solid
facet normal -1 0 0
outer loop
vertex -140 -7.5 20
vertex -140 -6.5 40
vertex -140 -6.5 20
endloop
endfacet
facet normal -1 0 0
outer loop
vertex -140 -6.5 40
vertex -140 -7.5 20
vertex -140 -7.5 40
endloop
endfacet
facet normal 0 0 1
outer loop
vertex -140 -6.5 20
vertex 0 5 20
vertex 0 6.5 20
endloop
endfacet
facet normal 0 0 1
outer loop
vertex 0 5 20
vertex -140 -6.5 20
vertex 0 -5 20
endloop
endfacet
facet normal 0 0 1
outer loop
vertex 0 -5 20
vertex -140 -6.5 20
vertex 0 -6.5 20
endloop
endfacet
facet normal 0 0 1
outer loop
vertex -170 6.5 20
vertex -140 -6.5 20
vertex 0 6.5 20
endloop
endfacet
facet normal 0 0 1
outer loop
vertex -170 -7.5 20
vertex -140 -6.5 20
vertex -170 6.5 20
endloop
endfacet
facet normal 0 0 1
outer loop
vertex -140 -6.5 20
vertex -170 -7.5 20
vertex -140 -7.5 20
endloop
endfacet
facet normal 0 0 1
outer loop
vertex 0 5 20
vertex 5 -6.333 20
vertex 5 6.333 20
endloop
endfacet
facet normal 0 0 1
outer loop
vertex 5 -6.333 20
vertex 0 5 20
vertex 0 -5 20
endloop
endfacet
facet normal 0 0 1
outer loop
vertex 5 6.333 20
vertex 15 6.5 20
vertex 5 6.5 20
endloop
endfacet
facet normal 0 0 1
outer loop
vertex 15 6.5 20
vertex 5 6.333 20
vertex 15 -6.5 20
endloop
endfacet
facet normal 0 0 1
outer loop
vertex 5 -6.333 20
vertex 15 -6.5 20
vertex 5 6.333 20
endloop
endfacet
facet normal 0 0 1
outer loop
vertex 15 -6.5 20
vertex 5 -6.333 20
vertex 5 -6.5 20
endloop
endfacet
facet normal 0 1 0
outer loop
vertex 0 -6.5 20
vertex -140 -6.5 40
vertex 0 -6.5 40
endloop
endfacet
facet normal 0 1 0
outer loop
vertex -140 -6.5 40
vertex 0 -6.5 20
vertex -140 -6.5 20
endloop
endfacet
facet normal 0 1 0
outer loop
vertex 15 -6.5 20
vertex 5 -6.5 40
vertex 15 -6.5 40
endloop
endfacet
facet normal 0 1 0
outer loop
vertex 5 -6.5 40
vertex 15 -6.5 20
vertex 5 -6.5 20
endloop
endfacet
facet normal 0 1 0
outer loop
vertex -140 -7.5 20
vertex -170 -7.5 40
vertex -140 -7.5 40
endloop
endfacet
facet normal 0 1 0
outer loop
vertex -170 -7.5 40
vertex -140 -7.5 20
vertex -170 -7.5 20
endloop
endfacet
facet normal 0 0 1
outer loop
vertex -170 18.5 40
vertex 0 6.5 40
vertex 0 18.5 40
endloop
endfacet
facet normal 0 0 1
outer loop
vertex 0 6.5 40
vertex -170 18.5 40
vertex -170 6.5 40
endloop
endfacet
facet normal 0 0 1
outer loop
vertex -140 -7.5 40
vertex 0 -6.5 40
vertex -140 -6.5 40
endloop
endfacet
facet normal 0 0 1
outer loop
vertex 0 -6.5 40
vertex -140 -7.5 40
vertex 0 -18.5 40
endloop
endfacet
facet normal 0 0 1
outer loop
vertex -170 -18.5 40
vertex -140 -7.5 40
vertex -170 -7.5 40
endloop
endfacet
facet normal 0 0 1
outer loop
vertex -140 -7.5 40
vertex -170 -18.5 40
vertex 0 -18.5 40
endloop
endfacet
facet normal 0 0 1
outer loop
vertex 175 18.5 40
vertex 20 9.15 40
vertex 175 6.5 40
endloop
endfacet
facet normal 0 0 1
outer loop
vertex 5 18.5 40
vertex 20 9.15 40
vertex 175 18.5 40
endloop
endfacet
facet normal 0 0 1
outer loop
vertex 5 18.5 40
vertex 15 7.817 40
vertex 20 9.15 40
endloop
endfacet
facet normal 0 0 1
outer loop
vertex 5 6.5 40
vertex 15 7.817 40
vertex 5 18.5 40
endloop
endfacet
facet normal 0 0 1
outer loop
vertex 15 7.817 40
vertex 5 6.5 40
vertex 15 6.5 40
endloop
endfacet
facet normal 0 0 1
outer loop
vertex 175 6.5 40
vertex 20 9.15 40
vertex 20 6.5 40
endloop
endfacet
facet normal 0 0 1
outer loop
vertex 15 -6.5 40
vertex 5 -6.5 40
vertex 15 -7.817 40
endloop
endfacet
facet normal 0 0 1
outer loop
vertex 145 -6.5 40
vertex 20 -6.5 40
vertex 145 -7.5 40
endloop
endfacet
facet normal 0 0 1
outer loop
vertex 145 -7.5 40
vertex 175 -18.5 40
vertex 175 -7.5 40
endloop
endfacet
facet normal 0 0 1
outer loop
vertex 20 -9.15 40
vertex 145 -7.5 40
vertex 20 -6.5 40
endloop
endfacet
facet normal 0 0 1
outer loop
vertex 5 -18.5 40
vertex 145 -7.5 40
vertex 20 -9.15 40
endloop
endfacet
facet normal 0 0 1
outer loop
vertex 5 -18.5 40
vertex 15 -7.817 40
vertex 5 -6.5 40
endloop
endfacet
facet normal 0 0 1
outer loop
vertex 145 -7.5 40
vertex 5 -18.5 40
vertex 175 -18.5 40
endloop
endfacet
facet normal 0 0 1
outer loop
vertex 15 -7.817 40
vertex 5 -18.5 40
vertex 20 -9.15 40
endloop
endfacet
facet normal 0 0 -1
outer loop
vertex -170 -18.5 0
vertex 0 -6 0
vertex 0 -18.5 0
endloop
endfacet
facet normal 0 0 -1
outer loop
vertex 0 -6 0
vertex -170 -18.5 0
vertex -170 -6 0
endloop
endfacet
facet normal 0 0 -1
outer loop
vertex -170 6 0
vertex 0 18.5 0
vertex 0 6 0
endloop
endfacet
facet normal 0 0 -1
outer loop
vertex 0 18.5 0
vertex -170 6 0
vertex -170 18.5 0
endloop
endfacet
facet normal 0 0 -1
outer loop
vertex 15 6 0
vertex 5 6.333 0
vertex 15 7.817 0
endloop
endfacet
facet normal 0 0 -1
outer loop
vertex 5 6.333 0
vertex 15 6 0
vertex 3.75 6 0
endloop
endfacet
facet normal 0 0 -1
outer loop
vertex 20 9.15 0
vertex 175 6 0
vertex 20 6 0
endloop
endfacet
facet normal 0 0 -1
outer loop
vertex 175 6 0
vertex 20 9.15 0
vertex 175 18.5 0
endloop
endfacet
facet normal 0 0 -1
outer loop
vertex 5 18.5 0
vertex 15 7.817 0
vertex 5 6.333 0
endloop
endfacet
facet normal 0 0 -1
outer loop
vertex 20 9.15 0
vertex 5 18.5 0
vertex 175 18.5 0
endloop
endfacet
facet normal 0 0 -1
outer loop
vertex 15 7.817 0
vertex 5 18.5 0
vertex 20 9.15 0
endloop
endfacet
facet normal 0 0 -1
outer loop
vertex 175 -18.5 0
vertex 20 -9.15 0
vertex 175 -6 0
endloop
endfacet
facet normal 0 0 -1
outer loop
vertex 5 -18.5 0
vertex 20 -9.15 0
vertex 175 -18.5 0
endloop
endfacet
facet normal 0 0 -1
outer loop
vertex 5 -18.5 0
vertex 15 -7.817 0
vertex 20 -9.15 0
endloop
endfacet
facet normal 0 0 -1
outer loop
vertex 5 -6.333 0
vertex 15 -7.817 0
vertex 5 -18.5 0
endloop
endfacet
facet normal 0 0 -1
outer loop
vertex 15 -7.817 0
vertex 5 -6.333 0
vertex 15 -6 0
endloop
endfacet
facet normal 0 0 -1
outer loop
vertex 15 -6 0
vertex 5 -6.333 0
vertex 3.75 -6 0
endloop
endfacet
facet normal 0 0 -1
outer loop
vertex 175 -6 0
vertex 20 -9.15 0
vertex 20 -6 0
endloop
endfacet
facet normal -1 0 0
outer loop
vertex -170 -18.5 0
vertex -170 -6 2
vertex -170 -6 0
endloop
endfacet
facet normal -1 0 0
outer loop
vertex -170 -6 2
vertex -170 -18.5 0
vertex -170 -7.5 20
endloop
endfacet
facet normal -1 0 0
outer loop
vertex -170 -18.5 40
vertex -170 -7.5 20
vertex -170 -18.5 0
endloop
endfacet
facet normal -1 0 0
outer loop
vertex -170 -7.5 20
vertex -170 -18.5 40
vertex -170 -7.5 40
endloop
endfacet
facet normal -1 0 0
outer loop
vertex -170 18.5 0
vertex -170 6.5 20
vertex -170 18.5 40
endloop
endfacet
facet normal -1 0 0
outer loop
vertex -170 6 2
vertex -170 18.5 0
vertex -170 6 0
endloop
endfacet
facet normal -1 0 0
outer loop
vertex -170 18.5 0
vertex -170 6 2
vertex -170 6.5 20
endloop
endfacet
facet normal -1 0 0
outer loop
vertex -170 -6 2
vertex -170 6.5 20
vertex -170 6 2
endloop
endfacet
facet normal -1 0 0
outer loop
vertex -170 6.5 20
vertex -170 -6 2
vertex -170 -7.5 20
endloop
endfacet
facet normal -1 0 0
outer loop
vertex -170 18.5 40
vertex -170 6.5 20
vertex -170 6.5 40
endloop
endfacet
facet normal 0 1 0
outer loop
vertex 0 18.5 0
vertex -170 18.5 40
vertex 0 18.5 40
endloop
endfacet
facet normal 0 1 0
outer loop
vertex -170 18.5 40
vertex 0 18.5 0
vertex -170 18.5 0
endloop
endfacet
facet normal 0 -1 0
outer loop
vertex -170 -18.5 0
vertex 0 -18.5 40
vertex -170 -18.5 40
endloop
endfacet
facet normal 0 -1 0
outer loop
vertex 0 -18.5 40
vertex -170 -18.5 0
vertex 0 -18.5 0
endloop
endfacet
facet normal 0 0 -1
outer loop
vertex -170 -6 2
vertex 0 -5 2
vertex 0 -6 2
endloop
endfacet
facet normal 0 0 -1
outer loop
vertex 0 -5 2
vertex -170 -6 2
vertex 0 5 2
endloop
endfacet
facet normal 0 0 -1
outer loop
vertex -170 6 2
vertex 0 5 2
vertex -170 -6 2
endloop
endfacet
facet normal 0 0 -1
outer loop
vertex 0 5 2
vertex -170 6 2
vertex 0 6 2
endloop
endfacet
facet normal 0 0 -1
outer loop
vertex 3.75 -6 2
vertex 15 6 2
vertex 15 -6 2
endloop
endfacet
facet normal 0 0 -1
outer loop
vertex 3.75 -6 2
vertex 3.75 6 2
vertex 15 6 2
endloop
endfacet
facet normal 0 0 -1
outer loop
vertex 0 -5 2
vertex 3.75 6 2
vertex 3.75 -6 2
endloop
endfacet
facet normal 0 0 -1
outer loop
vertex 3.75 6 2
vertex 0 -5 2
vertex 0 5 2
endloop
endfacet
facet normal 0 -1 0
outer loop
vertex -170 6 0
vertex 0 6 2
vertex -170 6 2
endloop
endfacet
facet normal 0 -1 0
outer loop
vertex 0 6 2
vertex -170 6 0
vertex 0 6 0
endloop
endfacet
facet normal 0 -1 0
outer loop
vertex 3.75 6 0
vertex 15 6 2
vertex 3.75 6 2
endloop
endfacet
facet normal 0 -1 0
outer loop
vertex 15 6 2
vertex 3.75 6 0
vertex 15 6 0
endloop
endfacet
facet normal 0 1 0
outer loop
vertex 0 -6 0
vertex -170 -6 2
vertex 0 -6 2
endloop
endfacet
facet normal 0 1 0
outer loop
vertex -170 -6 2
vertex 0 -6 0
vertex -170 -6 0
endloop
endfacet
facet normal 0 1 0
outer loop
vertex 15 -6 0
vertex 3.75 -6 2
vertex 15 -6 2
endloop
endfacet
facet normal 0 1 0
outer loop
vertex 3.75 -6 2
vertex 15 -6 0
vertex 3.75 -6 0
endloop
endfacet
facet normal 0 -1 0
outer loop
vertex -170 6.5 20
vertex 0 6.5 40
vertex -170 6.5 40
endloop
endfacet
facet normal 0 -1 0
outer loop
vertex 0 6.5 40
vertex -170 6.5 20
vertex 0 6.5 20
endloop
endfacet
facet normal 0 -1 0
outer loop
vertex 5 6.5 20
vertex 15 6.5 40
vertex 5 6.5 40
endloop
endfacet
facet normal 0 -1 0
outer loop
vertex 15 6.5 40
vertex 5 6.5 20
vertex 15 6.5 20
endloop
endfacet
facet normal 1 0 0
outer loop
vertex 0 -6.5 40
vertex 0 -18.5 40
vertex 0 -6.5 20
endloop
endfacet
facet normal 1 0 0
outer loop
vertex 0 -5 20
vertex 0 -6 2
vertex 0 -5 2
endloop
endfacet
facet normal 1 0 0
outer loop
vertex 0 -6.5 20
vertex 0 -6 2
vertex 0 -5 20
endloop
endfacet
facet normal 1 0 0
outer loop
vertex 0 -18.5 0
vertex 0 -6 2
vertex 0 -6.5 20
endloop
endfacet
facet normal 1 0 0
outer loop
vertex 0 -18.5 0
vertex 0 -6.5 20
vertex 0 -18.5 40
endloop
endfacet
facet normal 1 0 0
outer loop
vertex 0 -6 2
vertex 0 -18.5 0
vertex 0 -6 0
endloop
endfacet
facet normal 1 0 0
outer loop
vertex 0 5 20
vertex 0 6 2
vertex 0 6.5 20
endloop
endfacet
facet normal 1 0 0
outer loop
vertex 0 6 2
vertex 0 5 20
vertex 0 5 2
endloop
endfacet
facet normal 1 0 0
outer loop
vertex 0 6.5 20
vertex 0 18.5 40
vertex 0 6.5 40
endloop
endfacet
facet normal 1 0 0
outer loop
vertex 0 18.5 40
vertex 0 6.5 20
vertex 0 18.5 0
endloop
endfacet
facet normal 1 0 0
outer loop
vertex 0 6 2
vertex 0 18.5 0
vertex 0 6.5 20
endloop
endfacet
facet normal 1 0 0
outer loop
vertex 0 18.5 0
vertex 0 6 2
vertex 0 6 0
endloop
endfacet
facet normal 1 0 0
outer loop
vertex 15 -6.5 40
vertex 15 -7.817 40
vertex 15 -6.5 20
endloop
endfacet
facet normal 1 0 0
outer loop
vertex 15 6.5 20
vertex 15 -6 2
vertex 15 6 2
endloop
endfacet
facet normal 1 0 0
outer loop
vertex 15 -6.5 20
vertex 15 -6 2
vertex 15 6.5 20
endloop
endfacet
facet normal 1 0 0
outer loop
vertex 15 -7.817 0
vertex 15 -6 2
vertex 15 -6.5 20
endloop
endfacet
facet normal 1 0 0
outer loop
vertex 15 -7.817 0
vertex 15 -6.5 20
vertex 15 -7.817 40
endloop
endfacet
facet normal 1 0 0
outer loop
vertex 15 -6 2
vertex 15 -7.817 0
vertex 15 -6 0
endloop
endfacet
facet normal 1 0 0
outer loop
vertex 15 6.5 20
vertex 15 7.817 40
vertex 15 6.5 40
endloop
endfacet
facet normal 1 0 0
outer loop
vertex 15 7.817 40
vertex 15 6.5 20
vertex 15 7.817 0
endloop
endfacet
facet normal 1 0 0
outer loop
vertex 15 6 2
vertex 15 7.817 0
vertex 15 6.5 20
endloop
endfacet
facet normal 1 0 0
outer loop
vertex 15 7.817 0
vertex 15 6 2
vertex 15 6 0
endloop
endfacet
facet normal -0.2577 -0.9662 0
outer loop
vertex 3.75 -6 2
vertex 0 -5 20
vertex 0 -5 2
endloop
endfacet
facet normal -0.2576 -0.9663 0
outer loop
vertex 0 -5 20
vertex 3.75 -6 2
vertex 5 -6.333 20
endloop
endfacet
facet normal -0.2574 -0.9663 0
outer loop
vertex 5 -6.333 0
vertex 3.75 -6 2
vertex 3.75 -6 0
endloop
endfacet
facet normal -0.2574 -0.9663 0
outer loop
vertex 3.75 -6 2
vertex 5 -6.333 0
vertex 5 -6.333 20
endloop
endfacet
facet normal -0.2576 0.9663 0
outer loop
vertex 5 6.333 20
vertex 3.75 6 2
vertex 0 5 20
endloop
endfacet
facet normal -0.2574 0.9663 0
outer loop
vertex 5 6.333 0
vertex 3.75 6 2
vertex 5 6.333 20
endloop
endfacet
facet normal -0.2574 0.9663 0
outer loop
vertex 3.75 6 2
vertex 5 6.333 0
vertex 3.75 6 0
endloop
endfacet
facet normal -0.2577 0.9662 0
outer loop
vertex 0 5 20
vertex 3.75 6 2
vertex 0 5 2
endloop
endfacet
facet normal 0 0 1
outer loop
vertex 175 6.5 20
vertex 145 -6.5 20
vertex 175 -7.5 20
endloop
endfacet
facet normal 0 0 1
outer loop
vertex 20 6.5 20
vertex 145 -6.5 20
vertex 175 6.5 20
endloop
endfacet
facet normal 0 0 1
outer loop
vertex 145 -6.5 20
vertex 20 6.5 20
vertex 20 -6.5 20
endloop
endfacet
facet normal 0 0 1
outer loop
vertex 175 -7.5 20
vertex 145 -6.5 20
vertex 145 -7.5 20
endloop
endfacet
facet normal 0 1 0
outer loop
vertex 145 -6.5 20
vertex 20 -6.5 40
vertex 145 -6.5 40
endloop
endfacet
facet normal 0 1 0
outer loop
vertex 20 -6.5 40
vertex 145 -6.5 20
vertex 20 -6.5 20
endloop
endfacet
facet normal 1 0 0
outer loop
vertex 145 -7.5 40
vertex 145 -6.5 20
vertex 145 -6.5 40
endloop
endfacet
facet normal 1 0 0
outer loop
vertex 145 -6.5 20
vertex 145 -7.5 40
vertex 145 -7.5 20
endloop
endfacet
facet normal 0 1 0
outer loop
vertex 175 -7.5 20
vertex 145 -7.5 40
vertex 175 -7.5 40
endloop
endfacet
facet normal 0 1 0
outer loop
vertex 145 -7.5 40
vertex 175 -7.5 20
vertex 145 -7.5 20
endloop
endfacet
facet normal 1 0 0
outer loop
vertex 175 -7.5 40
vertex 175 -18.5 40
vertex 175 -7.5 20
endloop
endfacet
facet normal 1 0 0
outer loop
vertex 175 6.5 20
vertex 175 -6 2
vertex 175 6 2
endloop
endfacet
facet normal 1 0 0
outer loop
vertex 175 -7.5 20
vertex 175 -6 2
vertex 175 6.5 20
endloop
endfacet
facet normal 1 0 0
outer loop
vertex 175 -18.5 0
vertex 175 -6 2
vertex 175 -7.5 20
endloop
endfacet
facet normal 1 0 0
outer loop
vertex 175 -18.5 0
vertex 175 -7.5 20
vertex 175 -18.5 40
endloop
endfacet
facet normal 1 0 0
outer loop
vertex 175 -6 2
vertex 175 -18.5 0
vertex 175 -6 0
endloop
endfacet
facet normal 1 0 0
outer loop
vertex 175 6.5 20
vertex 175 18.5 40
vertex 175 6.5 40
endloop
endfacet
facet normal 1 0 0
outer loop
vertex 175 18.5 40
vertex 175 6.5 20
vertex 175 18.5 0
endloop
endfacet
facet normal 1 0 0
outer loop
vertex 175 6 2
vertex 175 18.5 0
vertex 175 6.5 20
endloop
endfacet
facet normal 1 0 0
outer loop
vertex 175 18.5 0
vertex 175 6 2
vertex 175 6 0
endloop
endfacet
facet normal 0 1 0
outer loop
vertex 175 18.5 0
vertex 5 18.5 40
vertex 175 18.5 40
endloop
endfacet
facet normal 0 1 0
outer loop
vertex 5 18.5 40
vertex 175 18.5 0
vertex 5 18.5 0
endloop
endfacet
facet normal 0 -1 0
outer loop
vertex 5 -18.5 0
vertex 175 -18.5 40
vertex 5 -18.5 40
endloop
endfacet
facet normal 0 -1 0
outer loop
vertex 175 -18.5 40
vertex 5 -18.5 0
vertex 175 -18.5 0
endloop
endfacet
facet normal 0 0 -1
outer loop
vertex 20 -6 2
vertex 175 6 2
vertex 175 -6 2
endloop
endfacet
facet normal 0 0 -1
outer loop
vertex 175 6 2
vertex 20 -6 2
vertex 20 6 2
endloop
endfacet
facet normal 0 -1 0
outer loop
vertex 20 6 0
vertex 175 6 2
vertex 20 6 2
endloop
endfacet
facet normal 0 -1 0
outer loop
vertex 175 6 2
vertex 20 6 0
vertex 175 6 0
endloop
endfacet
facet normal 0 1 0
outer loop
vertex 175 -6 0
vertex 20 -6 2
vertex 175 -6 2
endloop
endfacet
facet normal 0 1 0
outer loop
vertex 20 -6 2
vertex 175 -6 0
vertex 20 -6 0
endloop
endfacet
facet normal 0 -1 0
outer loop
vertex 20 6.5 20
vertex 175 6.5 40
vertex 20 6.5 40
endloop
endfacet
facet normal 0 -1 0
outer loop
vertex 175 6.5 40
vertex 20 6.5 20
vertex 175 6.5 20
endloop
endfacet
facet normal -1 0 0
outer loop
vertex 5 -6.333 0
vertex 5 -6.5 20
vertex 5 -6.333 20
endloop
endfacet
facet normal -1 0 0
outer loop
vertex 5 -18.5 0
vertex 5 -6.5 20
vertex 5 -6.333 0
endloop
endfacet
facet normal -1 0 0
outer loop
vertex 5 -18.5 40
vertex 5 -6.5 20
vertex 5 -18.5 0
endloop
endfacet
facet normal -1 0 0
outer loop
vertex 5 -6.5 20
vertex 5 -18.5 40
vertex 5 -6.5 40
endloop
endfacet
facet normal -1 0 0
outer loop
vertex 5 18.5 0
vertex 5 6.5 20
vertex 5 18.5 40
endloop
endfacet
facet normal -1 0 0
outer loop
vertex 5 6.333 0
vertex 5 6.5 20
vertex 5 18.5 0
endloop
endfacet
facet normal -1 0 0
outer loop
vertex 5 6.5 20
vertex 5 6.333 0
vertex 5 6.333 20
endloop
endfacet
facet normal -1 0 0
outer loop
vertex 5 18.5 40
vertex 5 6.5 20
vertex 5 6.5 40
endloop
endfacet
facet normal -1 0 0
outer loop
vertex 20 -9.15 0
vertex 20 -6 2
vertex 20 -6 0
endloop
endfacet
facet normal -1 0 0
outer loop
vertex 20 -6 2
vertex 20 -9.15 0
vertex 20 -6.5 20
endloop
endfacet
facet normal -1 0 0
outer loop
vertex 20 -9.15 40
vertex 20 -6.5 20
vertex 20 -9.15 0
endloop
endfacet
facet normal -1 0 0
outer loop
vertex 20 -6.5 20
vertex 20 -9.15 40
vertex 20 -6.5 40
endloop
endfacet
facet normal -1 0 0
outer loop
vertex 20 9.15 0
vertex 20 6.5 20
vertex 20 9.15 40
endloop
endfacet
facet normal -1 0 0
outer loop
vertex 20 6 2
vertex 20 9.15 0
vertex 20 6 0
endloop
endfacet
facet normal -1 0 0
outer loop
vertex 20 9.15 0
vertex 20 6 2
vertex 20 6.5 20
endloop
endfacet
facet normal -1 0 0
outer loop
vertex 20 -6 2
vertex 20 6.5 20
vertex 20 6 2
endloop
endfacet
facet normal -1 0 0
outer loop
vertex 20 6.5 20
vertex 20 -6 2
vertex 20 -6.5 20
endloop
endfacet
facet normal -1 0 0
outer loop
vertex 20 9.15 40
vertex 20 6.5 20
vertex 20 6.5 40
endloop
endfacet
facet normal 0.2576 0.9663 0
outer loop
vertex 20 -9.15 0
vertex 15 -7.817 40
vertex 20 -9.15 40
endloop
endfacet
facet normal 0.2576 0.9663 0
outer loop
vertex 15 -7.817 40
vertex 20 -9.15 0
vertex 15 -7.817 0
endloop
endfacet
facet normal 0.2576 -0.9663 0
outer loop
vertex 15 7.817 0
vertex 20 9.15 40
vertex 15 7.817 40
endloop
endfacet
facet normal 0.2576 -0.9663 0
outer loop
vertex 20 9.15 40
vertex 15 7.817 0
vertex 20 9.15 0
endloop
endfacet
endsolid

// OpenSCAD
// --- Print Selection ---
// 0 = View Both (Preview only)
// 1 = Left Side (Male)
// 2 = Right Side (Female)
print_selection = 0;

// --- Dimensions (in mm) ---
total_length = 340; 
total_height = 40;
total_width  = 37;

// Grooves
bottom_groove_width = 12; 
bottom_groove_depth = 2;

top_groove_width = 13;
top_groove_depth = 20;

// --- Relief (Widening the Slit) ---
// This widens the groove at the very ends to fit the L-shape
relief_length = 30;      // How far into the bar the wider section goes
relief_widen_by = 1;    // How much wider to make the slit (2mm)
relief_on_top = true;   // Apply to the Top Groove (Exhaust Panel)?
relief_on_bottom = false; // Apply to the Bottom Groove (Window Track)?

// Dovetail Tolerance
joint_tolerance = 0.15;

// --- Main Logic ---

module full_bar() {
    difference() {
        // 1. Main Block
        translate([-total_length/2, -total_width/2, 0])
        cube([total_length, total_width, total_height]);

        // 2. Bottom Groove
        translate([-total_length/2 - 1, -bottom_groove_width/2, -0.1])
        cube([total_length + 2, bottom_groove_width, bottom_groove_depth + 0.1]);

        // 3. Top Groove
        translate([-total_length/2 - 1, -top_groove_width/2, total_height - top_groove_depth])
        cube([total_length + 2, top_groove_width, top_groove_depth + 0.1]);

        // 4. Relief Cuts (Widening the Slit at Ends)
        
        // --- TOP GROOVE RELIEFS ---
        if (relief_on_top) {
            // Cut "Left" End (widens the -Y side of the groove)
            translate([-total_length/2 - 0.1, -top_groove_width/2 - relief_widen_by, total_height - top_groove_depth])
            cube([relief_length + 0.1, relief_widen_by, top_groove_depth + 0.1]);

            // Cut "Right" End (widens the -Y side of the groove)
            translate([total_length/2 - relief_length, -top_groove_width/2 - relief_widen_by, total_height - top_groove_depth])
            cube([relief_length + 0.1, relief_widen_by, top_groove_depth + 0.1]);
        }

        // --- BOTTOM GROOVE RELIEFS (Optional) ---
        if (relief_on_bottom) {
            translate([-total_length/2 - 0.1, -bottom_groove_width/2 - relief_widen_by, -0.1])
            cube([relief_length + 0.1, relief_widen_by, bottom_groove_depth + 0.2]);

            translate([total_length/2 - relief_length, -bottom_groove_width/2 - relief_widen_by, -0.1])
            cube([relief_length + 0.1, relief_widen_by, bottom_groove_depth + 0.2]);
        }
    }
}

module dovetail_shape(offset_val) {
    wedge_len = 15;
    wedge_max_width = 18;
    wedge_min_width = 10;
    
    linear_extrude(height=total_height+1, center=false)
    polygon(points=[
        [0, -wedge_min_width/2 + offset_val],
        [wedge_len, -wedge_max_width/2 + offset_val],
        [wedge_len, wedge_max_width/2 - offset_val],
        [0, wedge_min_width/2 - offset_val]
    ]);
}

module cutter_mask(is_hole) {
    offset_val = is_hole ? joint_tolerance : 0;
    
    union() {
        translate([-total_length, -total_width, -1])
        cube([total_length, total_width*2, total_height+2]);
        
        translate([0,0,-1])
        dovetail_shape(is_hole ? -joint_tolerance : 0);
    }
}

// --- Rendering ---
if (print_selection == 0) {
    color("Cyan") intersection() { full_bar(); cutter_mask(false); }
    color("Yellow") translate([5, 0, 0]) difference() { full_bar(); cutter_mask(true); }
} else if (print_selection == 1) {
    intersection() { full_bar(); cutter_mask(false); }
} else if (print_selection == 2) {
    difference() { full_bar(); cutter_mask(true); }
}
